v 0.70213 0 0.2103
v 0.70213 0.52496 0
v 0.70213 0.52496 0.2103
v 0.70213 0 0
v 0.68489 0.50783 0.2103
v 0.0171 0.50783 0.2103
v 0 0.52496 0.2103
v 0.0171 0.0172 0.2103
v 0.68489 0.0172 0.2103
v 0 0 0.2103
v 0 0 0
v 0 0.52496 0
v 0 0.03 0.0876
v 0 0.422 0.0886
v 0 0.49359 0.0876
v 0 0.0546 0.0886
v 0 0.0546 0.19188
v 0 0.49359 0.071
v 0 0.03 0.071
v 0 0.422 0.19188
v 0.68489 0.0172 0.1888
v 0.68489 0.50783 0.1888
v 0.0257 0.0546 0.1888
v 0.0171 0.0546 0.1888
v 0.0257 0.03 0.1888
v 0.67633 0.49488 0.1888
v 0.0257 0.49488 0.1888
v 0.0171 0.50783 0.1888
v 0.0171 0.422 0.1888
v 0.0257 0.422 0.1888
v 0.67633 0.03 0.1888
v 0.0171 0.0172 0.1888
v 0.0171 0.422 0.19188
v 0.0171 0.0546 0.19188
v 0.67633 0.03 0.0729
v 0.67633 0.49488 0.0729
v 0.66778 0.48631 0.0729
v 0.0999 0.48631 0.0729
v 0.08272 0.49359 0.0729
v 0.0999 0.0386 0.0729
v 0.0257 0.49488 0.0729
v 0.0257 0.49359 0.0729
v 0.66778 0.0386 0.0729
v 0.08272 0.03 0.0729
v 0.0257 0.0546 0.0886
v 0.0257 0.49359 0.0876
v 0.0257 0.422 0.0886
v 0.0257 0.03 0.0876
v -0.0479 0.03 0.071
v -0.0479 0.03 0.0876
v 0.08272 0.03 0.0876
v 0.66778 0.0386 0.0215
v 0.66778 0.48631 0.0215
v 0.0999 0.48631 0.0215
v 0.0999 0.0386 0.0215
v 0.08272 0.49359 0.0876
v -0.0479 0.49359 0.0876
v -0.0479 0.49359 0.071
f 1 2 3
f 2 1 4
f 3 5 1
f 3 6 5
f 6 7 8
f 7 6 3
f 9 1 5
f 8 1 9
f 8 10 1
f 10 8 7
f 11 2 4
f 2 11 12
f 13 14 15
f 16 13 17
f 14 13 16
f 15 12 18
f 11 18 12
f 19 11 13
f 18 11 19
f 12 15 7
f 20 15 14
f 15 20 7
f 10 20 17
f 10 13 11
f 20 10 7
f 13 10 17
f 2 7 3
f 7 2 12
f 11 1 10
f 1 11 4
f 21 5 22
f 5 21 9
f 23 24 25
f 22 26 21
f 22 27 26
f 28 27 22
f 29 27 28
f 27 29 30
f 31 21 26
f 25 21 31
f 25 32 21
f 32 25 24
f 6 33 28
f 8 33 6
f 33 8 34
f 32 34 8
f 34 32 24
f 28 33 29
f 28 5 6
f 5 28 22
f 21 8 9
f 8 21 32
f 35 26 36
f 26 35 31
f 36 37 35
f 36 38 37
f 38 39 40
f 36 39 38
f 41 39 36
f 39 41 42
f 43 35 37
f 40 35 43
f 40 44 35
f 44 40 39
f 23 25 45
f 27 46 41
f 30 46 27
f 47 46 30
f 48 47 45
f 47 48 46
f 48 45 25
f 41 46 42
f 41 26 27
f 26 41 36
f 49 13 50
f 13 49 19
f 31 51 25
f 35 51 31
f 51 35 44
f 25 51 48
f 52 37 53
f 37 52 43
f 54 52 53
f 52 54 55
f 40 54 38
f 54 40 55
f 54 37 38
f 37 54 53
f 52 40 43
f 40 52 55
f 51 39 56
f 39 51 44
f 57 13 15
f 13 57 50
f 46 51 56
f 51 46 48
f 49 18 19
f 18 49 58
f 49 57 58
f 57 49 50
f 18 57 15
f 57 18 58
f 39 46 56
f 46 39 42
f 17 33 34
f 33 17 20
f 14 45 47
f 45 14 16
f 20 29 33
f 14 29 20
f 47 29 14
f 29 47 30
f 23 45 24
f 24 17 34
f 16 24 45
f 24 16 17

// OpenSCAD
// Parametric stepped recess block with side projection and recess
// Coordinate system:
//   X: Left-right (0 = left edge of main body, +X = right)
//   Y: Front-back (0 = front edge of main body, +Y = back)
//   Z: Vertical (0 = underside/bottom, +Z = up)
$fn = 32;
eps = 0.002; // Small epsilon for clean booleans, eliminates coplanar faces

// ------------------------------
// Main reference body dimensions
// ------------------------------
main_length = 0.702127;
main_width = 0.524964;
main_height = 0.2103;
bottom_wall = 0.0215; // Bottom wall thickness below lowest pocket

// ------------------------------
// Top shallow recess (top surface cut)
// ------------------------------
top_rec_x = 0.667793;
top_rec_y = 0.490631;
top_rec_left_inset = 0.0171;
top_rec_front_inset = 0.0172;
top_rec_z_bottom = 0.1888;
top_rec_depth = 0.0215;

// ------------------------------
// Middle stepped cut (continues top opening downward)
// ------------------------------
mid_cut_x = 0.650626;
mid_cut_y = 0.46488;
mid_cut_left_inset = 0.0257;
mid_cut_front_inset = 0.03;
mid_cut_z_bottom = 0.0729;
mid_cut_depth = 0.1159;

// ------------------------------
// Lower offset pocket (deepest internal cut)
// ------------------------------
lower_pkt_x = 0.567882;
lower_pkt_y = 0.447713;
lower_pkt_left_inset = 0.0999;
lower_pkt_front_inset = 0.0386;
lower_pkt_z_bottom = 0.0215;
lower_pkt_depth = 0.0515;

// ------------------------------
// Left side solid projection (external overhang + internal ledge)
// ------------------------------
proj_x = 0.130618;
proj_y = 0.463588;
proj_left_overhang = 0.0479; // Overhang past main body left edge
proj_front_inset = 0.03;
proj_z_bottom = 0.073;
proj_thickness = 0.0146;

// ------------------------------
// Left side recess (cut above side projection)
// ------------------------------
rec_x_depth = 0.0343;
rec_y = 0.3674;
rec_front_inset = 0.0546;
rec_z_bottom = 0.0876;
rec_height = 0.101285;

// ------------------------------
// Model construction
// ------------------------------
difference() {
    union() {
        // Base body with primary internal cuts
        difference() {
            // Start with solid main reference block
            cube([main_length, main_width, main_height]);

            // Remove top shallow recess, extend slightly past top surface
            translate([top_rec_left_inset, top_rec_front_inset, top_rec_z_bottom])
                cube([top_rec_x, top_rec_y, top_rec_depth + eps]);

            // Remove middle stepped cut, extend up to connect cleanly with top recess
            translate([mid_cut_left_inset, mid_cut_front_inset, mid_cut_z_bottom])
                cube([mid_cut_x, mid_cut_y, mid_cut_depth + eps]);

            // Remove lower pocket, extend up into (already void) middle cut area
            translate([lower_pkt_left_inset, lower_pkt_front_inset, lower_pkt_z_bottom])
                cube([lower_pkt_x, lower_pkt_y, lower_pkt_depth + eps]);
        }

        // Add solid side projection after internal cuts to preserve internal ledge
        // Extend slightly down to mate cleanly with support walls below
        translate([-proj_left_overhang, proj_front_inset, proj_z_bottom - eps])
            cube([proj_x, proj_y, proj_thickness + eps]);
    }

    // Remove side recess last, start slightly above projection to avoid cutting it
    translate([-eps, rec_front_inset, rec_z_bottom + eps/2])
        cube([rec_x_depth + eps, rec_y, rec_height + eps]);
}
